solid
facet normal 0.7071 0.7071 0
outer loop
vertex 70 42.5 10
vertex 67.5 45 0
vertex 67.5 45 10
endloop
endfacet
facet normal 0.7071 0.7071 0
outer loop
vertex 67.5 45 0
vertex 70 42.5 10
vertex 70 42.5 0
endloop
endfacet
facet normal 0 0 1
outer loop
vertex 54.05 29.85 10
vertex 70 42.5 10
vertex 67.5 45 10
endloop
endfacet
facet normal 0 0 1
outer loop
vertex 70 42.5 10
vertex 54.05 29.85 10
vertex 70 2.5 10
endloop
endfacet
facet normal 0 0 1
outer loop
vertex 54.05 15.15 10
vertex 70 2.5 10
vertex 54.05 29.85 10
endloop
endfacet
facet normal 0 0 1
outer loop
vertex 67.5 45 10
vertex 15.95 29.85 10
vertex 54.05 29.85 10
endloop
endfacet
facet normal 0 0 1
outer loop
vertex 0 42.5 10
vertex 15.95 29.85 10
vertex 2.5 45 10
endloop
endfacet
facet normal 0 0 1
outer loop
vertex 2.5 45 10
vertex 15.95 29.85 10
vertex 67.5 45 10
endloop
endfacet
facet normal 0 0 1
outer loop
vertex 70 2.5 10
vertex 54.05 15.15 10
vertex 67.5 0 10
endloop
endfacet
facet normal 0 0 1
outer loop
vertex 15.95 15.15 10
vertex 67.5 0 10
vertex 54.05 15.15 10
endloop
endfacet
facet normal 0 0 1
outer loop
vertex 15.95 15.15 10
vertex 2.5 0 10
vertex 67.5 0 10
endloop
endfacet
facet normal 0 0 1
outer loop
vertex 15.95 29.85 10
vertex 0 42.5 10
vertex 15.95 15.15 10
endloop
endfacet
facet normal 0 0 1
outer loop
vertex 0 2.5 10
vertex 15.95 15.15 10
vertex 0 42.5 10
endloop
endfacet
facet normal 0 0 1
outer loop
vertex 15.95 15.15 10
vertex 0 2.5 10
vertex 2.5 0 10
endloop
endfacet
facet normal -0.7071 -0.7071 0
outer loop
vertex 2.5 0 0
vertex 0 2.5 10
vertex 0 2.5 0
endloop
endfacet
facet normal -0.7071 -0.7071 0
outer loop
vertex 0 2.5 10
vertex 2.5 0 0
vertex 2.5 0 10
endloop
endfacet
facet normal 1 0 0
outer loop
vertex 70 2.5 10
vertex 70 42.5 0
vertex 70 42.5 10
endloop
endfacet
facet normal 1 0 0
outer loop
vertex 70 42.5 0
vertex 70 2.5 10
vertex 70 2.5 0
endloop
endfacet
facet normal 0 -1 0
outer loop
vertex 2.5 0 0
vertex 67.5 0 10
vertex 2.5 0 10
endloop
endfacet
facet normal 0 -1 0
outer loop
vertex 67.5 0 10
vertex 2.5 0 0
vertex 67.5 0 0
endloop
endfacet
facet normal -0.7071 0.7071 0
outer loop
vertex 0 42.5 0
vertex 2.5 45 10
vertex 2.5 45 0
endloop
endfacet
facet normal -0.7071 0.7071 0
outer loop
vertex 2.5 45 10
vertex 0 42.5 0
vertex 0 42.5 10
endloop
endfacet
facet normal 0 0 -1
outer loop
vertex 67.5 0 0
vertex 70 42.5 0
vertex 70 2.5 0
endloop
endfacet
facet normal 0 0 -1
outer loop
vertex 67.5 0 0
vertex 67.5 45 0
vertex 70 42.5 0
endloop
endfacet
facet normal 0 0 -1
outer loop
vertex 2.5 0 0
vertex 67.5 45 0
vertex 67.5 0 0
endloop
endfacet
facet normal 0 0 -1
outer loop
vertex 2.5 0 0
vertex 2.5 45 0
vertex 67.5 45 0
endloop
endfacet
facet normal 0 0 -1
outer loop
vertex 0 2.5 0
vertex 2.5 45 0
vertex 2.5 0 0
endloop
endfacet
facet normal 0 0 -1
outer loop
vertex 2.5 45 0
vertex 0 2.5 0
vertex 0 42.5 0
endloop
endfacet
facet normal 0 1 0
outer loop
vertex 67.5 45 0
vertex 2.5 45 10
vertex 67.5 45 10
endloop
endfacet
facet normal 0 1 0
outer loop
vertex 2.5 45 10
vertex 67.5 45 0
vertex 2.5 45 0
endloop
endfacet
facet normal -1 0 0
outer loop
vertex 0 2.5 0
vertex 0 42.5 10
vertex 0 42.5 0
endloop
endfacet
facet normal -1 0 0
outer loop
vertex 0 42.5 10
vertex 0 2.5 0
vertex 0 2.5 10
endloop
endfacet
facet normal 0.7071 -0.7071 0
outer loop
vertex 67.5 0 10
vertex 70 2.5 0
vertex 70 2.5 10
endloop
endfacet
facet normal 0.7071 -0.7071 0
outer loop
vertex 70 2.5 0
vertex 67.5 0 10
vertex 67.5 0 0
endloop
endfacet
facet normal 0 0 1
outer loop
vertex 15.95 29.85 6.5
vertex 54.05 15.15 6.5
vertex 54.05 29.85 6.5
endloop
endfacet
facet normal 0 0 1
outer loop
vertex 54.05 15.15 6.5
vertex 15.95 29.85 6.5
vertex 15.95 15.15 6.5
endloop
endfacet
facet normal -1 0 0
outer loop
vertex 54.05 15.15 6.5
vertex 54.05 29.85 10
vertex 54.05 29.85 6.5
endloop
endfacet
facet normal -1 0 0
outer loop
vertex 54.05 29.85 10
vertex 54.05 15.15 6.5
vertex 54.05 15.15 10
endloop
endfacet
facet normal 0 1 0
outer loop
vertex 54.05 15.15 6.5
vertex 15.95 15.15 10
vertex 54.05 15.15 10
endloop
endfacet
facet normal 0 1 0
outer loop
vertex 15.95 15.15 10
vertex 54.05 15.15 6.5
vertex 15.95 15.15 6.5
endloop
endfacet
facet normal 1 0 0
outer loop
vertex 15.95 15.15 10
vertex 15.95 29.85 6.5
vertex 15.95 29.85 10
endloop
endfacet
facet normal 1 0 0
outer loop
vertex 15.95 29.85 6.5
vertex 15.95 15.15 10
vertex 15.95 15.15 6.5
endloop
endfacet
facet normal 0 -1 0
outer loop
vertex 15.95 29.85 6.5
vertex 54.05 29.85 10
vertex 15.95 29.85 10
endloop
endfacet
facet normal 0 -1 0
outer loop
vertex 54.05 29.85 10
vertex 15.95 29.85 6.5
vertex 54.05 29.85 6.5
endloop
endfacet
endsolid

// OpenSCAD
$fn = 32;

// ----------------------------------------------------------------------
// Windowed plate: 1 voids, 70 x 45 x 10 mm
// ----------------------------------------------------------------------

// --- parameters (mm) ---
plate_l = 70;             // plate length, X
plate_w = 45;             // plate width, Y
plate_t = 10;             // plate thickness, Z
edge_margin = 10;         // wall from the plate edge to any window
win1_l = 38.1;            // window length
win1_w = 14.7;            // window width
depth_1 = 3.5;            // depth of void 1 (full thickness = through)
corner_c = 2.5;           // corner chamfer of the plate

profile = [[2.5, 0], [67.5, 0], [70, 2.5], [70, 42.5], [67.5, 45], [2.5, 45], [0, 42.5], [0, 2.5]];  // primary outline, 8 points, counter clockwise
void_1 = [[15.95, 15.15], [54.05, 15.15], [54.05, 29.85], [15.95, 29.85]];  // large central window, 4 points

// --- the one profile operation ---
difference() {
  linear_extrude(height = plate_t) polygon(points = profile);
  translate([0, 0, plate_t - depth_1])
    linear_extrude(height = depth_1 + 1) polygon(points = void_1);
}
